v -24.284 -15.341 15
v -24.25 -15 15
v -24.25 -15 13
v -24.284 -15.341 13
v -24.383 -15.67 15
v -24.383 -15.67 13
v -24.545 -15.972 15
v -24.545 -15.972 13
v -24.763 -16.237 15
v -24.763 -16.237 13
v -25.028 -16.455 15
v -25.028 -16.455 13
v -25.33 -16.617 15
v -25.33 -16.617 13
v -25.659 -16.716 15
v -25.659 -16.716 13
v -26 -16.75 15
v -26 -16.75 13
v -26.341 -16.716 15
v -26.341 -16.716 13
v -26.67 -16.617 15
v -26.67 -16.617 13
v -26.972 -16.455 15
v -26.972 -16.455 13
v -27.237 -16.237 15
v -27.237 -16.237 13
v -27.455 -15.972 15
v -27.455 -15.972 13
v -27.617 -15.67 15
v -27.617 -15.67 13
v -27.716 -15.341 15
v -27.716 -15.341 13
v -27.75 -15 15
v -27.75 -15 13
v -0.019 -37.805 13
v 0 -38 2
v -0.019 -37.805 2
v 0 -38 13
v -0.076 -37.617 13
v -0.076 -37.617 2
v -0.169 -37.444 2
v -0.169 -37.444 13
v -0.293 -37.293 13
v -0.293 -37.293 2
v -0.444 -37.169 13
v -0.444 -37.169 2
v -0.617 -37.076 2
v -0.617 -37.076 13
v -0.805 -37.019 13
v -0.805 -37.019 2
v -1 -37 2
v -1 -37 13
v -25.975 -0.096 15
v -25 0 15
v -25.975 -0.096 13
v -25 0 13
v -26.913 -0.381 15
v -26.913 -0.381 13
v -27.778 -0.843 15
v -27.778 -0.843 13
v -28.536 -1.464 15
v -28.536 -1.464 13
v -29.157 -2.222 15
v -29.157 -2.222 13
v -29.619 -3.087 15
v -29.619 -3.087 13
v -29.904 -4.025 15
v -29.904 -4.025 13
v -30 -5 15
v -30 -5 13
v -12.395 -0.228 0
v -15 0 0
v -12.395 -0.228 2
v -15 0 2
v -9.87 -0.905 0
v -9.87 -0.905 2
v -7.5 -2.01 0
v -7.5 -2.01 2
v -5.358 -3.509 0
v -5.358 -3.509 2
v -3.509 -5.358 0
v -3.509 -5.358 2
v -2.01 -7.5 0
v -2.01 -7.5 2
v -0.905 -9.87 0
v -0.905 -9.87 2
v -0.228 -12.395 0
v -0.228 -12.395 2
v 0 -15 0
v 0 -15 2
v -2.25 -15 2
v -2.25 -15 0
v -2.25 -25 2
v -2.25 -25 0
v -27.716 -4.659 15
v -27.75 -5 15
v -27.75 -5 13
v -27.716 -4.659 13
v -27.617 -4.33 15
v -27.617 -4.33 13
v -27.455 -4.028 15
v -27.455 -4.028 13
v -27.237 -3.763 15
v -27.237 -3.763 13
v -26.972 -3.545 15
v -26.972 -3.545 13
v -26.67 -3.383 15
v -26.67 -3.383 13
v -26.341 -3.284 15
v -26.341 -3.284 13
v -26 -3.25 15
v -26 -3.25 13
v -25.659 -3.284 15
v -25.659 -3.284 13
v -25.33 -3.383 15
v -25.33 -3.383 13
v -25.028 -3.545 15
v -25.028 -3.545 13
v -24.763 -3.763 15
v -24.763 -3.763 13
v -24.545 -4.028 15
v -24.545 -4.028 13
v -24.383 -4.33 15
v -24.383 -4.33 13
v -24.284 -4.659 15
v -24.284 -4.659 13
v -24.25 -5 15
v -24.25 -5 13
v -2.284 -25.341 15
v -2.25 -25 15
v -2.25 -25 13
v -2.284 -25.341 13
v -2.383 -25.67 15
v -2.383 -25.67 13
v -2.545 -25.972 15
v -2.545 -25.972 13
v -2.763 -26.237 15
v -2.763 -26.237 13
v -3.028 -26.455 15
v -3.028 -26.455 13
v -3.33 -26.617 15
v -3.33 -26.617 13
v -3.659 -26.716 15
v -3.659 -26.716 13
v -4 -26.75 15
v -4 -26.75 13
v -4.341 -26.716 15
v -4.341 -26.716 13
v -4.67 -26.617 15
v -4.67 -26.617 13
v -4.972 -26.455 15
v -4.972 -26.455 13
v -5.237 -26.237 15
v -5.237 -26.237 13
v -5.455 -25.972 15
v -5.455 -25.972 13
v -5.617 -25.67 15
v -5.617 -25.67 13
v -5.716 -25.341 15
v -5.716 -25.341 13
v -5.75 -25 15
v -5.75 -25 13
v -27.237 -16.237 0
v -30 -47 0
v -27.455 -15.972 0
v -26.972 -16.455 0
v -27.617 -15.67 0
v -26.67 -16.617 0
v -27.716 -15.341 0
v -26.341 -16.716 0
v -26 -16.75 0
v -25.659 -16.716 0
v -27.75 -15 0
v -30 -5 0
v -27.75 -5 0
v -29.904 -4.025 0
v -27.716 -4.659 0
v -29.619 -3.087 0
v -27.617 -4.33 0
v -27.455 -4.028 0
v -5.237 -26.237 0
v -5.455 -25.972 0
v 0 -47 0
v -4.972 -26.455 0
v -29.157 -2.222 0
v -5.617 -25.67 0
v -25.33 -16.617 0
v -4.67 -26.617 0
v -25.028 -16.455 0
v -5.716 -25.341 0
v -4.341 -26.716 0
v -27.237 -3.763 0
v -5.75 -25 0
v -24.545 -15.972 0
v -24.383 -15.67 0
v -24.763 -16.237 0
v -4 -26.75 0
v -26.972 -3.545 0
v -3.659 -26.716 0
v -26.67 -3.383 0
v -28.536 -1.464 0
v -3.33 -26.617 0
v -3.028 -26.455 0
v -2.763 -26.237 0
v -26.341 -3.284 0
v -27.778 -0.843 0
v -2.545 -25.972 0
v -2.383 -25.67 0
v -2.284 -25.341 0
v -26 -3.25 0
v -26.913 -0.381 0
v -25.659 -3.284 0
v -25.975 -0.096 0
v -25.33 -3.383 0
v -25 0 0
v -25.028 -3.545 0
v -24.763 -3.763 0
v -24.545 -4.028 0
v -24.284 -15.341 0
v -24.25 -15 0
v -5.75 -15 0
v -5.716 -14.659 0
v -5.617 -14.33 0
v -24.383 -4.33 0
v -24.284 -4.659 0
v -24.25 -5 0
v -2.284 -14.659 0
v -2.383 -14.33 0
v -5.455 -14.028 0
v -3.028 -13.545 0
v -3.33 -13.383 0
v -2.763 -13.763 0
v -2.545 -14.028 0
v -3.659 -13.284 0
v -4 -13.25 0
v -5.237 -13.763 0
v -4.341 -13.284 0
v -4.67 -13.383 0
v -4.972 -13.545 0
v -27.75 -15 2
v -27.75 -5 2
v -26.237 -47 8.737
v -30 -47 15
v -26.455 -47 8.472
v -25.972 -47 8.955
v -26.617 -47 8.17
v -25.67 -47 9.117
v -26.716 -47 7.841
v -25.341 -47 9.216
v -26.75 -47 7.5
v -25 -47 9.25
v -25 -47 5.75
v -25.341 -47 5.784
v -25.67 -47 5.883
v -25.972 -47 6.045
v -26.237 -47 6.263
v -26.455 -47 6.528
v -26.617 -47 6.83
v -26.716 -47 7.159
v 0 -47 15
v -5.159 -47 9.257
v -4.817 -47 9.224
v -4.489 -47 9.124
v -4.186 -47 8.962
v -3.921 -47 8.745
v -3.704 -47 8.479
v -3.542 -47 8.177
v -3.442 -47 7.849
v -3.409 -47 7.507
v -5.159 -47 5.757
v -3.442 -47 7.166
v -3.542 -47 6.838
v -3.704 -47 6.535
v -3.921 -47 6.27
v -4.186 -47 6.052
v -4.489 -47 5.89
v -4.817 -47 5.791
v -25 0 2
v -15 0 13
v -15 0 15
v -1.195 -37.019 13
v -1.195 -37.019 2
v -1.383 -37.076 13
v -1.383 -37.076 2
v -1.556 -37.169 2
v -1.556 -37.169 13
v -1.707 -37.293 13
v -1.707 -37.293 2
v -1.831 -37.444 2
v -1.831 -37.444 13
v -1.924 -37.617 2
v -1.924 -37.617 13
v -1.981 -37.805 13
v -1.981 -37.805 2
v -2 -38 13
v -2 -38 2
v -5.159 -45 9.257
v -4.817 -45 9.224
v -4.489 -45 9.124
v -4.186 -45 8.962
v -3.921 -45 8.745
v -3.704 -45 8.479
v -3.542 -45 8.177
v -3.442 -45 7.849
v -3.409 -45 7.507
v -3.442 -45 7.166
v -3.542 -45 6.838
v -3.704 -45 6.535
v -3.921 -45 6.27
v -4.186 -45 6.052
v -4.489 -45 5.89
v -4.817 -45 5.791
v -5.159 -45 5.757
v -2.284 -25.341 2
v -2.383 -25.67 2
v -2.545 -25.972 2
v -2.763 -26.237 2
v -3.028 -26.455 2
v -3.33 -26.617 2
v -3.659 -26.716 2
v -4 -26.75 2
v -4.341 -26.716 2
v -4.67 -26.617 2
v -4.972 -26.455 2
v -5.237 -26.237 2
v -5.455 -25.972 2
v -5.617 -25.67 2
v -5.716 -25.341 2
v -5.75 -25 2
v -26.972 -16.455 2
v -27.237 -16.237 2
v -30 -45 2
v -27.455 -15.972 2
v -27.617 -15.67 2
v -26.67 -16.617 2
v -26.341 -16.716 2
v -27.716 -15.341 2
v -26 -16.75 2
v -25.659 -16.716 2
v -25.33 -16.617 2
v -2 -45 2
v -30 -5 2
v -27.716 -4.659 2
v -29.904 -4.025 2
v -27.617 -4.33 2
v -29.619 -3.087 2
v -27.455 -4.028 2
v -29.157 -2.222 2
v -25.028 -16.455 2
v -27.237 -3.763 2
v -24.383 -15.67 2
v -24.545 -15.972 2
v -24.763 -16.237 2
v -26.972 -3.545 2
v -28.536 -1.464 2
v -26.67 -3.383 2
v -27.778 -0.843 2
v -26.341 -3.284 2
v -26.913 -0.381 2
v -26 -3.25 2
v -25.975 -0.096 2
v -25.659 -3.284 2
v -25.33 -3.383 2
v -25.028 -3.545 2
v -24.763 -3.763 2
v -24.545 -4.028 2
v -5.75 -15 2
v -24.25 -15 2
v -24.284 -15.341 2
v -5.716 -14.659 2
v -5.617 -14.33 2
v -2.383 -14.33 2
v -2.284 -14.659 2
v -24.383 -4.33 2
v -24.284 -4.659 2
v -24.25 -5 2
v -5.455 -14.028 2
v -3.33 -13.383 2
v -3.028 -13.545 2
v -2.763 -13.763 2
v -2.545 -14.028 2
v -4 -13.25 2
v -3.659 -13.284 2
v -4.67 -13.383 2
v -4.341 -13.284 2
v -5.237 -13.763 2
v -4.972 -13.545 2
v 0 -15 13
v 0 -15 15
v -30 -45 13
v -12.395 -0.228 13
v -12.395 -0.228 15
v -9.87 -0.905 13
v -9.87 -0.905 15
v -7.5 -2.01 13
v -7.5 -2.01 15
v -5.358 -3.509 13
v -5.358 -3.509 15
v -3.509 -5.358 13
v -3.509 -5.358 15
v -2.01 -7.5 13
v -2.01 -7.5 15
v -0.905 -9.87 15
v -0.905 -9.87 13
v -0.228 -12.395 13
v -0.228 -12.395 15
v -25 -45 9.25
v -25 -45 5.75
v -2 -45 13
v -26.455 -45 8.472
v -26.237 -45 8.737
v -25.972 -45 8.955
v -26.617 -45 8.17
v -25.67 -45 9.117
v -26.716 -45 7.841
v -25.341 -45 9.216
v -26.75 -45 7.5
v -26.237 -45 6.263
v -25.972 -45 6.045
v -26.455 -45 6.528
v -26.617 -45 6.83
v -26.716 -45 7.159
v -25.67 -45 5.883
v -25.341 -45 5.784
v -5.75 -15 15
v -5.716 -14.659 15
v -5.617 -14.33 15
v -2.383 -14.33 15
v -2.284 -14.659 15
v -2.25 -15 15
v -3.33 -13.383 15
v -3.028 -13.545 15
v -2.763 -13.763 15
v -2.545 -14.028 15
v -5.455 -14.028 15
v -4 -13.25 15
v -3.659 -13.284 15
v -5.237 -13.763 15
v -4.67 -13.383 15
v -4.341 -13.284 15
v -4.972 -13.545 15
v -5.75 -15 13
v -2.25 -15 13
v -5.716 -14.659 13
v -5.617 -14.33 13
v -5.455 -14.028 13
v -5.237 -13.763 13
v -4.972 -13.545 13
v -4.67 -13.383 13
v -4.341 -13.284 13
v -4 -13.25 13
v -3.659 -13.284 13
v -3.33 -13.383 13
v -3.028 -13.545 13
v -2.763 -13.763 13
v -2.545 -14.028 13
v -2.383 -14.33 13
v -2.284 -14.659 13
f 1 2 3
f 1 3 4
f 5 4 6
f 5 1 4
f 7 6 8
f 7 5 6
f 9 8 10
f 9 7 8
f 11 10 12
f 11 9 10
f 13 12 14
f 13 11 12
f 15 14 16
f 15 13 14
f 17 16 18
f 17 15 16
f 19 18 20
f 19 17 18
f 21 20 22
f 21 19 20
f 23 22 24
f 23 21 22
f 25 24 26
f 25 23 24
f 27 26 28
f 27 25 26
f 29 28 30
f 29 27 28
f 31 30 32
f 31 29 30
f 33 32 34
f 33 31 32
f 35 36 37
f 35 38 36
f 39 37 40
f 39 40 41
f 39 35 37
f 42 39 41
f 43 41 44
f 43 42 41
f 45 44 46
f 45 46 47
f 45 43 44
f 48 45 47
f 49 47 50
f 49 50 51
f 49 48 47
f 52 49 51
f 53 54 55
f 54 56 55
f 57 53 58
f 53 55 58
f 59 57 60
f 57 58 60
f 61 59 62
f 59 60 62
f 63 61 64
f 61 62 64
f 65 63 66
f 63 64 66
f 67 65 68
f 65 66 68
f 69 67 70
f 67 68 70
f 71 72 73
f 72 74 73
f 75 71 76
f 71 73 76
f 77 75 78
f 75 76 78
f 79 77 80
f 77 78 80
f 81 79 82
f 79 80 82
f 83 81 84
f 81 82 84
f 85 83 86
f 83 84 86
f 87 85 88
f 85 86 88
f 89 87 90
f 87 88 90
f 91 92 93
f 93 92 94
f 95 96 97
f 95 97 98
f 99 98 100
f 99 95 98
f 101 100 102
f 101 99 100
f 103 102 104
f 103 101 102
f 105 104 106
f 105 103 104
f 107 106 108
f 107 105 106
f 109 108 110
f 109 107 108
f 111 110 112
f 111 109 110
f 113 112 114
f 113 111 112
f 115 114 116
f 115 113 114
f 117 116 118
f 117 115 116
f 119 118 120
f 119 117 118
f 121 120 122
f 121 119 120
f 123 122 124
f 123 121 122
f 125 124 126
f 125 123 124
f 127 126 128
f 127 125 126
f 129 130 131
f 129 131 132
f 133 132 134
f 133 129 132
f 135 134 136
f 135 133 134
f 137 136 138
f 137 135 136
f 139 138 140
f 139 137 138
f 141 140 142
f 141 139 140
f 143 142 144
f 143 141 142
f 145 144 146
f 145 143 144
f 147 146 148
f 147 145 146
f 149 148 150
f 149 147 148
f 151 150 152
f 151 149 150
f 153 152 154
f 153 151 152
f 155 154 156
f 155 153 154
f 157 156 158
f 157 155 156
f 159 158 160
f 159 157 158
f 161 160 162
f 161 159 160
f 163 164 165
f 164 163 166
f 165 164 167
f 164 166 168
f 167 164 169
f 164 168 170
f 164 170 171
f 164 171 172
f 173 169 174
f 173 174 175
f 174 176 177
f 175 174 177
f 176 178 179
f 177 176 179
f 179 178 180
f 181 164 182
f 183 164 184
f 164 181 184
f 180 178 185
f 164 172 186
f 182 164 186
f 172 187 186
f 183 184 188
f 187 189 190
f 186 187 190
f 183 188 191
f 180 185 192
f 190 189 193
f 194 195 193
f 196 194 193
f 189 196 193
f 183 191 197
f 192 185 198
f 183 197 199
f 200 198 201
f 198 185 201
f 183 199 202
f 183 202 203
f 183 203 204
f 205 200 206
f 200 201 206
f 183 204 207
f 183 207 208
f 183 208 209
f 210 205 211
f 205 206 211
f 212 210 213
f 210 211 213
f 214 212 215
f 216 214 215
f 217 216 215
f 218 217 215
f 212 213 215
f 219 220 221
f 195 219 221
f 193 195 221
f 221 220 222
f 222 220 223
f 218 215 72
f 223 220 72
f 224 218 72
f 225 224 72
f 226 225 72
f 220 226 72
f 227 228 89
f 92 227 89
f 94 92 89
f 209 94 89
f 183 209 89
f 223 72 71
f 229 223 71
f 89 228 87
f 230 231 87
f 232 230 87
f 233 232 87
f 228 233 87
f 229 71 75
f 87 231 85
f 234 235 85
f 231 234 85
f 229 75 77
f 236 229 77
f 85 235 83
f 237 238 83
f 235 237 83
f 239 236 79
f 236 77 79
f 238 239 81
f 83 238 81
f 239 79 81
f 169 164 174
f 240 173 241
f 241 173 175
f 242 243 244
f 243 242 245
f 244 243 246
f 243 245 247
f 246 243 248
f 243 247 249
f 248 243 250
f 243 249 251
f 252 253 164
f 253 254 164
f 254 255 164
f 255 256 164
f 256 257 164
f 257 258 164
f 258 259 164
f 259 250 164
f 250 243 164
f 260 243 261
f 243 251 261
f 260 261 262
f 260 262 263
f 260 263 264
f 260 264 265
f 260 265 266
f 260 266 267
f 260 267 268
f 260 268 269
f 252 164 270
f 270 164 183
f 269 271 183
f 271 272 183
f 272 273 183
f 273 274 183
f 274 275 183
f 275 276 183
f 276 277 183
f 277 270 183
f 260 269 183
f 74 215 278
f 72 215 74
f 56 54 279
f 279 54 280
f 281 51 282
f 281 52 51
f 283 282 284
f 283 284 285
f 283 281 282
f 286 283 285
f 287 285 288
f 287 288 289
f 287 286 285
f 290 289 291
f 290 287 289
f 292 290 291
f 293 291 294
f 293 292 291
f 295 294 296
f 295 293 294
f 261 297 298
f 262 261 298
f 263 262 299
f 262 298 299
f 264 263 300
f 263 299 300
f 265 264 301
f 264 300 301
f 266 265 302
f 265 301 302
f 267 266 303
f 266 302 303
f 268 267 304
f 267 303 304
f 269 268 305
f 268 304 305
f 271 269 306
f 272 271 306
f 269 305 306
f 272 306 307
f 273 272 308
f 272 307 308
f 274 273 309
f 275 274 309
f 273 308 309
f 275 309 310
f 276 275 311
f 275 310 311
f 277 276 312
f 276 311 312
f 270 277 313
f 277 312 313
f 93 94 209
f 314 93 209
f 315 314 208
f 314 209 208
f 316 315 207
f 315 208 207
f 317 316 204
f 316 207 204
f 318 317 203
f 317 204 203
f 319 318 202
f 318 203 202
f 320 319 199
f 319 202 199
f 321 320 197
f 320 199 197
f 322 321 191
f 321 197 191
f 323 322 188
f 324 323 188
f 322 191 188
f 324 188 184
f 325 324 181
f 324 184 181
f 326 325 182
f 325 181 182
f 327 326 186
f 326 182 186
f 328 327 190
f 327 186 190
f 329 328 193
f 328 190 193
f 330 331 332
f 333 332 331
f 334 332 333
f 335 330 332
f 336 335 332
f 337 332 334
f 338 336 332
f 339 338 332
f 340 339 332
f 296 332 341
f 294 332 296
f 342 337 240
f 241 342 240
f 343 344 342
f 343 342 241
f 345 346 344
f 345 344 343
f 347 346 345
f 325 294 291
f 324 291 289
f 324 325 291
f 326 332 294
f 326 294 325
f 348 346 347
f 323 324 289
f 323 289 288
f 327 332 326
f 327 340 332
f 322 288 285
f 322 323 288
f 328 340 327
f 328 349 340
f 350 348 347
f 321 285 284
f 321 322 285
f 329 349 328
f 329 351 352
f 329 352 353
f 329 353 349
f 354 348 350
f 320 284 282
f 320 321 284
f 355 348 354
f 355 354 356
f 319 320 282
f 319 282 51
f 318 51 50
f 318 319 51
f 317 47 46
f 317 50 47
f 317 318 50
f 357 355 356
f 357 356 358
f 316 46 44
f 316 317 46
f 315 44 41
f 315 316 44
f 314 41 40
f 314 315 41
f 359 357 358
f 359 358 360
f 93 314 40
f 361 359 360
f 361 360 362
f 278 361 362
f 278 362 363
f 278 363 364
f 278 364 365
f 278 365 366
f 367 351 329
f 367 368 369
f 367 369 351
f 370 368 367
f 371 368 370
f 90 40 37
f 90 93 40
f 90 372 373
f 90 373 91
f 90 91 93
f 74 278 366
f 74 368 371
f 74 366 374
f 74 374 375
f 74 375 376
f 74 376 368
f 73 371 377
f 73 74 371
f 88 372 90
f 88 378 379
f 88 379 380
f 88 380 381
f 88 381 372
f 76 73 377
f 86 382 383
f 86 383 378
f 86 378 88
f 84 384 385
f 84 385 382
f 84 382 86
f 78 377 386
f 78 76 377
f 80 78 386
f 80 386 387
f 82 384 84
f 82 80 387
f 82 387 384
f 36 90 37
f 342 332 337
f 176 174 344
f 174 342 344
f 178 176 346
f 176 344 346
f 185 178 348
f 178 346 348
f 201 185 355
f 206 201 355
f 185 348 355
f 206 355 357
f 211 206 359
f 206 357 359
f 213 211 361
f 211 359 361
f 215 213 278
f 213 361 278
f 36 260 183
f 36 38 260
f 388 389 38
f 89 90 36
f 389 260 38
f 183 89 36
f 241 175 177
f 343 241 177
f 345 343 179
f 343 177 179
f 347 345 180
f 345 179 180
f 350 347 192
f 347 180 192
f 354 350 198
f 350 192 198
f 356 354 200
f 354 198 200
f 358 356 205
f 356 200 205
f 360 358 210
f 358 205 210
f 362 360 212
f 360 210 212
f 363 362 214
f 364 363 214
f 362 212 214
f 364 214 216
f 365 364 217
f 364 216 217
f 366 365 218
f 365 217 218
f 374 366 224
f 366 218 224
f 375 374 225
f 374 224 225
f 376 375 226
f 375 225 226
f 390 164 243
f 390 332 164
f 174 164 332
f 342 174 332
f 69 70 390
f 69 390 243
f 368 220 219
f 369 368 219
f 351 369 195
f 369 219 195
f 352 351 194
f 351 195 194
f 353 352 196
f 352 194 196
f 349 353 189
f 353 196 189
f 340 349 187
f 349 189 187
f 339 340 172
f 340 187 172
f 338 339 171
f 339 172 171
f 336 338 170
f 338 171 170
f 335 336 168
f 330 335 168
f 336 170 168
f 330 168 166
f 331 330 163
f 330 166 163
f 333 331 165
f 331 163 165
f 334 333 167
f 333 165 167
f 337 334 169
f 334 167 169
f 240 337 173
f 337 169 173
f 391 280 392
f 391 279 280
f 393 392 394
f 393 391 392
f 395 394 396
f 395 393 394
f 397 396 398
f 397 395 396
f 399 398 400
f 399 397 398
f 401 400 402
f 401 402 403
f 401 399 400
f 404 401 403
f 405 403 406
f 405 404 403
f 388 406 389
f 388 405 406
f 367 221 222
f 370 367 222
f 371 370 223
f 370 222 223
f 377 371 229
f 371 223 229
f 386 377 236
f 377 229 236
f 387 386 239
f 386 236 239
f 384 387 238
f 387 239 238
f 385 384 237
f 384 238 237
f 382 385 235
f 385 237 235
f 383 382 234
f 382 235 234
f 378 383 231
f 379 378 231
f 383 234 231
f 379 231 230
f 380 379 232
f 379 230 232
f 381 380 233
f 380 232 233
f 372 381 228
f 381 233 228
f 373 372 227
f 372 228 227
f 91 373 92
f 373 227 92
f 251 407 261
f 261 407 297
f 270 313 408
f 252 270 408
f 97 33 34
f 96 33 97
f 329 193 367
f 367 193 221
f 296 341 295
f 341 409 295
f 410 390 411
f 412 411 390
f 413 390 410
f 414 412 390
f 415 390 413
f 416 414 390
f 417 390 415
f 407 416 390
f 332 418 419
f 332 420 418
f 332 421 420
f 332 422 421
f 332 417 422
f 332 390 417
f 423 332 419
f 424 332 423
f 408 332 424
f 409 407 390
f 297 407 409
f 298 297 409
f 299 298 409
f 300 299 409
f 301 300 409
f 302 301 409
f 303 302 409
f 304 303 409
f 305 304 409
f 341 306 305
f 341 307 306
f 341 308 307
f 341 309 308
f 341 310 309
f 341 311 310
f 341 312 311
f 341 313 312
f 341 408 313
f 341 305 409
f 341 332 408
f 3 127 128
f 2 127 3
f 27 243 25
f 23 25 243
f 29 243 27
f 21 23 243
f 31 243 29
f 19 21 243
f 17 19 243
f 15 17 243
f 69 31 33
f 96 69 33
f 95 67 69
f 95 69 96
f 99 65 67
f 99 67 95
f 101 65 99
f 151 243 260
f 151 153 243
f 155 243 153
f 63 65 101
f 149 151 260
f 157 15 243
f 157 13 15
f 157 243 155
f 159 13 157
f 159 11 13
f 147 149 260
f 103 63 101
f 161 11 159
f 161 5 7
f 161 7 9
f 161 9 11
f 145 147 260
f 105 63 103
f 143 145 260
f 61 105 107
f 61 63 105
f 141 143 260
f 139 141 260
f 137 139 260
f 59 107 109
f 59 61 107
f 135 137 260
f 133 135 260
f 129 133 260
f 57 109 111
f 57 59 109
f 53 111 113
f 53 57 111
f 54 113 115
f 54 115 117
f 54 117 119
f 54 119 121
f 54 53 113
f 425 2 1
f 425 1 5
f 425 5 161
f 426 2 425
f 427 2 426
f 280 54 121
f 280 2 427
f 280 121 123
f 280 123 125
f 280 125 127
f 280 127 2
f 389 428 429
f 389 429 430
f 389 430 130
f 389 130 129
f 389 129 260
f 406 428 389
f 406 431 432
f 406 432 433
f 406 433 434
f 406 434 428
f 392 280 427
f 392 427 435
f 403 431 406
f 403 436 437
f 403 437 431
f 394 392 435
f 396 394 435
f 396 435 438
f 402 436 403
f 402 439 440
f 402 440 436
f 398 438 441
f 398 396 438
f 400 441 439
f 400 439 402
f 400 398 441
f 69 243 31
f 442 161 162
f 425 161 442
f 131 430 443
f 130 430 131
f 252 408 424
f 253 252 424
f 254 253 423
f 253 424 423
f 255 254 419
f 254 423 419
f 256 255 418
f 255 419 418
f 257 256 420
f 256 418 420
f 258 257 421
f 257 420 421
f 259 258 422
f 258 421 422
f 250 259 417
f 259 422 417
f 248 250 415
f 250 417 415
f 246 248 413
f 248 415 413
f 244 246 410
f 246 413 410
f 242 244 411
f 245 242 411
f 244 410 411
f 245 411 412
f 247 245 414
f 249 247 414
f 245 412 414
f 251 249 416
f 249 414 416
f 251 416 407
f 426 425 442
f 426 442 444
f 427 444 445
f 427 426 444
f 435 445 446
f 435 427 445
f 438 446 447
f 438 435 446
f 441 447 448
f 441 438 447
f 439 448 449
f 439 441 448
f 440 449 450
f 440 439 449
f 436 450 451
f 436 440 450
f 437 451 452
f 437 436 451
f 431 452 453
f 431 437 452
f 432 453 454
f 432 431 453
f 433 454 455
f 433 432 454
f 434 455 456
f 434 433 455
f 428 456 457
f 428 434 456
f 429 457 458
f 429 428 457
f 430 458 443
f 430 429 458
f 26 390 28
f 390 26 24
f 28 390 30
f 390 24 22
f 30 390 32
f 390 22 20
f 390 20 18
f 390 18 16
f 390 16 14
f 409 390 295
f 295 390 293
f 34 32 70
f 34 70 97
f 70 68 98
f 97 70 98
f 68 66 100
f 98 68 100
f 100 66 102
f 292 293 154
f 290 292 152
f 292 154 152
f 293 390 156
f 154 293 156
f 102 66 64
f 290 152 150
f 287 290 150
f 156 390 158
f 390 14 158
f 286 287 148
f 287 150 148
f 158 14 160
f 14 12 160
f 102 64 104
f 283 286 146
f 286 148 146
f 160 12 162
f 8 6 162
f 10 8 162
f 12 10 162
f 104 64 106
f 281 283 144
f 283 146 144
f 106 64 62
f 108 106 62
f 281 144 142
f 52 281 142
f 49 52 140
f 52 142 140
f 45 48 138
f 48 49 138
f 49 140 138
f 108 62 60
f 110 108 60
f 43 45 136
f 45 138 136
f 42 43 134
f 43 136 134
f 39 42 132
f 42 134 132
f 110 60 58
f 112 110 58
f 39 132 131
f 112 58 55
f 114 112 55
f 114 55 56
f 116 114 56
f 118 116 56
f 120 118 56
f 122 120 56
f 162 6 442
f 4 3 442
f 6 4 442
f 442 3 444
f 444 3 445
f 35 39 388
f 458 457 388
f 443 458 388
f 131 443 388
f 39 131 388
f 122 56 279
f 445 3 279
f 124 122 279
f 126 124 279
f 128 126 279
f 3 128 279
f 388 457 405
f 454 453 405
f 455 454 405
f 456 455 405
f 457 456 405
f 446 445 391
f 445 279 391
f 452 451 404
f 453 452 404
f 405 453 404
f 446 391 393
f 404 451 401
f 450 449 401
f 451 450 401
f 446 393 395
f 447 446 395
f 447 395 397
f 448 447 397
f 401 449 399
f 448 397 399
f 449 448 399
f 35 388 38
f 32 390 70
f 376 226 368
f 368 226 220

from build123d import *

# Parameters (mm, degrees)
F0_W     = 30
F0_H     = 45
F1_DEPTH = 2
F2_W     = 30
F2_H     = 2
F2_H_2   = 5.5
F3_DEPTH = 2
F6_DEPTH = 25
F7_W     = 8
F7_H     = 11
F8_DEPTH = 2
F9_R     = 15
F10_R    = 5
F11_R    = 0.99999


# Not quite as in the source:
# - a fillet or chamfer is up to 0.001 mm smaller than in the source, because OpenCascade refuses the exact size
# - ends of sketch curves that miss each other by under 0.0002 mm in the source are joined


with BuildPart() as f1:
    # F0 (on Top) → F1 (new body)
    with BuildSketch(Plane.XY):
        with Locations((-15, -22.5)):
            Rectangle(F0_W, F0_H)
        with BuildLine():
            ThreePointArc((-27.75, -5), (-26, -3.25), (-24.25, -5))
            Line((-24.25, -5), (-24.25, -15))
            ThreePointArc((-24.25, -15), (-26, -16.75), (-27.75, -15))
            Line((-27.75, -15), (-27.75, -5))
        make_face(mode=Mode.SUBTRACT)
        with BuildLine():
            Line((-2.25, -15), (-2.25, -25))
            ThreePointArc((-2.25, -25), (-4, -26.75), (-5.75, -25))
            Line((-5.75, -25), (-5.75, -15))
            ThreePointArc((-5.75, -15), (-4, -13.25), (-2.25, -15))
        make_face(mode=Mode.SUBTRACT)
    extrude(amount=F1_DEPTH)

    # F2 (on face) → F3 (join)
    with BuildSketch(Plane.XZ.offset(45)):
        with Locations((-15, 1)):
            Rectangle(F2_W, F2_H)
        with Locations((-15, 4.75)):
            Rectangle(F2_W, F2_H_2)
    extrude(amount=F3_DEPTH)

    # F4: F1 across face


with BuildPart() as f1_1:
    add(f1.part)
    add(f1.part.mirror(Plane(origin=(-15, -46, 7.5), x_dir=(1, 0, 0), z_dir=(0, 0, 1))))

    # F5 (on face) → F6 (cut)
    with BuildSketch(Plane(origin=(0, -45, 0), x_dir=(-1, 0, 0), z_dir=(0, 1, 0))):
        with BuildLine():
            ThreePointArc((5.1587387914, 9.2572143), (3.4087387914, 7.5072143), (5.1587387913, 5.7572143))
            Line((5.1587387913, 5.7572143), (25.0000000102, 5.7500001157))
            ThreePointArc((25.0000000102, 5.7500001157), (26.7500000102, 7.5), (25.0000000102, 9.25))
            Line((25.0000000102, 9.25), (5.1587387914, 9.2572143))
        make_face()
    extrude(amount=-F6_DEPTH, mode=Mode.SUBTRACT)

    # F7 (on face) → F8 (join)
    with BuildSketch(Plane.YZ):
        Polygon((-37, 13), (-37, 15), (-47, 15), (-47, 0), (-37, 0), (-37, 2), (-45, 2), (-45, 13), align=None)
        with Locations((-41, 7.5)):
            Rectangle(F7_W, F7_H)
    extrude(amount=-F8_DEPTH)

    # F9
    f9_edges = [f1_1.edges().sort_by_distance(p)[0] for p in [
        (0, 0, 1),
        (0, 0, 14),
    ]]
    fillet(f9_edges, radius=F9_R)

    # F10
    f10_edges = [f1_1.edges().sort_by_distance(p)[0] for p in [
        (-30, 0, 14),
        (-30, 0, 1),
    ]]
    fillet(f10_edges, radius=F10_R)

    # F11 (radius 1 in the source; OpenCascade refuses exactly that, so slightly less here)
    f11_edges = [f1_1.edges().sort_by_distance(p)[0] for p in [
        (-2, -37, 7.5),
        (0, -37, 7.5),
    ]]
    fillet(f11_edges, radius=F11_R)


solid = f1_1.part
